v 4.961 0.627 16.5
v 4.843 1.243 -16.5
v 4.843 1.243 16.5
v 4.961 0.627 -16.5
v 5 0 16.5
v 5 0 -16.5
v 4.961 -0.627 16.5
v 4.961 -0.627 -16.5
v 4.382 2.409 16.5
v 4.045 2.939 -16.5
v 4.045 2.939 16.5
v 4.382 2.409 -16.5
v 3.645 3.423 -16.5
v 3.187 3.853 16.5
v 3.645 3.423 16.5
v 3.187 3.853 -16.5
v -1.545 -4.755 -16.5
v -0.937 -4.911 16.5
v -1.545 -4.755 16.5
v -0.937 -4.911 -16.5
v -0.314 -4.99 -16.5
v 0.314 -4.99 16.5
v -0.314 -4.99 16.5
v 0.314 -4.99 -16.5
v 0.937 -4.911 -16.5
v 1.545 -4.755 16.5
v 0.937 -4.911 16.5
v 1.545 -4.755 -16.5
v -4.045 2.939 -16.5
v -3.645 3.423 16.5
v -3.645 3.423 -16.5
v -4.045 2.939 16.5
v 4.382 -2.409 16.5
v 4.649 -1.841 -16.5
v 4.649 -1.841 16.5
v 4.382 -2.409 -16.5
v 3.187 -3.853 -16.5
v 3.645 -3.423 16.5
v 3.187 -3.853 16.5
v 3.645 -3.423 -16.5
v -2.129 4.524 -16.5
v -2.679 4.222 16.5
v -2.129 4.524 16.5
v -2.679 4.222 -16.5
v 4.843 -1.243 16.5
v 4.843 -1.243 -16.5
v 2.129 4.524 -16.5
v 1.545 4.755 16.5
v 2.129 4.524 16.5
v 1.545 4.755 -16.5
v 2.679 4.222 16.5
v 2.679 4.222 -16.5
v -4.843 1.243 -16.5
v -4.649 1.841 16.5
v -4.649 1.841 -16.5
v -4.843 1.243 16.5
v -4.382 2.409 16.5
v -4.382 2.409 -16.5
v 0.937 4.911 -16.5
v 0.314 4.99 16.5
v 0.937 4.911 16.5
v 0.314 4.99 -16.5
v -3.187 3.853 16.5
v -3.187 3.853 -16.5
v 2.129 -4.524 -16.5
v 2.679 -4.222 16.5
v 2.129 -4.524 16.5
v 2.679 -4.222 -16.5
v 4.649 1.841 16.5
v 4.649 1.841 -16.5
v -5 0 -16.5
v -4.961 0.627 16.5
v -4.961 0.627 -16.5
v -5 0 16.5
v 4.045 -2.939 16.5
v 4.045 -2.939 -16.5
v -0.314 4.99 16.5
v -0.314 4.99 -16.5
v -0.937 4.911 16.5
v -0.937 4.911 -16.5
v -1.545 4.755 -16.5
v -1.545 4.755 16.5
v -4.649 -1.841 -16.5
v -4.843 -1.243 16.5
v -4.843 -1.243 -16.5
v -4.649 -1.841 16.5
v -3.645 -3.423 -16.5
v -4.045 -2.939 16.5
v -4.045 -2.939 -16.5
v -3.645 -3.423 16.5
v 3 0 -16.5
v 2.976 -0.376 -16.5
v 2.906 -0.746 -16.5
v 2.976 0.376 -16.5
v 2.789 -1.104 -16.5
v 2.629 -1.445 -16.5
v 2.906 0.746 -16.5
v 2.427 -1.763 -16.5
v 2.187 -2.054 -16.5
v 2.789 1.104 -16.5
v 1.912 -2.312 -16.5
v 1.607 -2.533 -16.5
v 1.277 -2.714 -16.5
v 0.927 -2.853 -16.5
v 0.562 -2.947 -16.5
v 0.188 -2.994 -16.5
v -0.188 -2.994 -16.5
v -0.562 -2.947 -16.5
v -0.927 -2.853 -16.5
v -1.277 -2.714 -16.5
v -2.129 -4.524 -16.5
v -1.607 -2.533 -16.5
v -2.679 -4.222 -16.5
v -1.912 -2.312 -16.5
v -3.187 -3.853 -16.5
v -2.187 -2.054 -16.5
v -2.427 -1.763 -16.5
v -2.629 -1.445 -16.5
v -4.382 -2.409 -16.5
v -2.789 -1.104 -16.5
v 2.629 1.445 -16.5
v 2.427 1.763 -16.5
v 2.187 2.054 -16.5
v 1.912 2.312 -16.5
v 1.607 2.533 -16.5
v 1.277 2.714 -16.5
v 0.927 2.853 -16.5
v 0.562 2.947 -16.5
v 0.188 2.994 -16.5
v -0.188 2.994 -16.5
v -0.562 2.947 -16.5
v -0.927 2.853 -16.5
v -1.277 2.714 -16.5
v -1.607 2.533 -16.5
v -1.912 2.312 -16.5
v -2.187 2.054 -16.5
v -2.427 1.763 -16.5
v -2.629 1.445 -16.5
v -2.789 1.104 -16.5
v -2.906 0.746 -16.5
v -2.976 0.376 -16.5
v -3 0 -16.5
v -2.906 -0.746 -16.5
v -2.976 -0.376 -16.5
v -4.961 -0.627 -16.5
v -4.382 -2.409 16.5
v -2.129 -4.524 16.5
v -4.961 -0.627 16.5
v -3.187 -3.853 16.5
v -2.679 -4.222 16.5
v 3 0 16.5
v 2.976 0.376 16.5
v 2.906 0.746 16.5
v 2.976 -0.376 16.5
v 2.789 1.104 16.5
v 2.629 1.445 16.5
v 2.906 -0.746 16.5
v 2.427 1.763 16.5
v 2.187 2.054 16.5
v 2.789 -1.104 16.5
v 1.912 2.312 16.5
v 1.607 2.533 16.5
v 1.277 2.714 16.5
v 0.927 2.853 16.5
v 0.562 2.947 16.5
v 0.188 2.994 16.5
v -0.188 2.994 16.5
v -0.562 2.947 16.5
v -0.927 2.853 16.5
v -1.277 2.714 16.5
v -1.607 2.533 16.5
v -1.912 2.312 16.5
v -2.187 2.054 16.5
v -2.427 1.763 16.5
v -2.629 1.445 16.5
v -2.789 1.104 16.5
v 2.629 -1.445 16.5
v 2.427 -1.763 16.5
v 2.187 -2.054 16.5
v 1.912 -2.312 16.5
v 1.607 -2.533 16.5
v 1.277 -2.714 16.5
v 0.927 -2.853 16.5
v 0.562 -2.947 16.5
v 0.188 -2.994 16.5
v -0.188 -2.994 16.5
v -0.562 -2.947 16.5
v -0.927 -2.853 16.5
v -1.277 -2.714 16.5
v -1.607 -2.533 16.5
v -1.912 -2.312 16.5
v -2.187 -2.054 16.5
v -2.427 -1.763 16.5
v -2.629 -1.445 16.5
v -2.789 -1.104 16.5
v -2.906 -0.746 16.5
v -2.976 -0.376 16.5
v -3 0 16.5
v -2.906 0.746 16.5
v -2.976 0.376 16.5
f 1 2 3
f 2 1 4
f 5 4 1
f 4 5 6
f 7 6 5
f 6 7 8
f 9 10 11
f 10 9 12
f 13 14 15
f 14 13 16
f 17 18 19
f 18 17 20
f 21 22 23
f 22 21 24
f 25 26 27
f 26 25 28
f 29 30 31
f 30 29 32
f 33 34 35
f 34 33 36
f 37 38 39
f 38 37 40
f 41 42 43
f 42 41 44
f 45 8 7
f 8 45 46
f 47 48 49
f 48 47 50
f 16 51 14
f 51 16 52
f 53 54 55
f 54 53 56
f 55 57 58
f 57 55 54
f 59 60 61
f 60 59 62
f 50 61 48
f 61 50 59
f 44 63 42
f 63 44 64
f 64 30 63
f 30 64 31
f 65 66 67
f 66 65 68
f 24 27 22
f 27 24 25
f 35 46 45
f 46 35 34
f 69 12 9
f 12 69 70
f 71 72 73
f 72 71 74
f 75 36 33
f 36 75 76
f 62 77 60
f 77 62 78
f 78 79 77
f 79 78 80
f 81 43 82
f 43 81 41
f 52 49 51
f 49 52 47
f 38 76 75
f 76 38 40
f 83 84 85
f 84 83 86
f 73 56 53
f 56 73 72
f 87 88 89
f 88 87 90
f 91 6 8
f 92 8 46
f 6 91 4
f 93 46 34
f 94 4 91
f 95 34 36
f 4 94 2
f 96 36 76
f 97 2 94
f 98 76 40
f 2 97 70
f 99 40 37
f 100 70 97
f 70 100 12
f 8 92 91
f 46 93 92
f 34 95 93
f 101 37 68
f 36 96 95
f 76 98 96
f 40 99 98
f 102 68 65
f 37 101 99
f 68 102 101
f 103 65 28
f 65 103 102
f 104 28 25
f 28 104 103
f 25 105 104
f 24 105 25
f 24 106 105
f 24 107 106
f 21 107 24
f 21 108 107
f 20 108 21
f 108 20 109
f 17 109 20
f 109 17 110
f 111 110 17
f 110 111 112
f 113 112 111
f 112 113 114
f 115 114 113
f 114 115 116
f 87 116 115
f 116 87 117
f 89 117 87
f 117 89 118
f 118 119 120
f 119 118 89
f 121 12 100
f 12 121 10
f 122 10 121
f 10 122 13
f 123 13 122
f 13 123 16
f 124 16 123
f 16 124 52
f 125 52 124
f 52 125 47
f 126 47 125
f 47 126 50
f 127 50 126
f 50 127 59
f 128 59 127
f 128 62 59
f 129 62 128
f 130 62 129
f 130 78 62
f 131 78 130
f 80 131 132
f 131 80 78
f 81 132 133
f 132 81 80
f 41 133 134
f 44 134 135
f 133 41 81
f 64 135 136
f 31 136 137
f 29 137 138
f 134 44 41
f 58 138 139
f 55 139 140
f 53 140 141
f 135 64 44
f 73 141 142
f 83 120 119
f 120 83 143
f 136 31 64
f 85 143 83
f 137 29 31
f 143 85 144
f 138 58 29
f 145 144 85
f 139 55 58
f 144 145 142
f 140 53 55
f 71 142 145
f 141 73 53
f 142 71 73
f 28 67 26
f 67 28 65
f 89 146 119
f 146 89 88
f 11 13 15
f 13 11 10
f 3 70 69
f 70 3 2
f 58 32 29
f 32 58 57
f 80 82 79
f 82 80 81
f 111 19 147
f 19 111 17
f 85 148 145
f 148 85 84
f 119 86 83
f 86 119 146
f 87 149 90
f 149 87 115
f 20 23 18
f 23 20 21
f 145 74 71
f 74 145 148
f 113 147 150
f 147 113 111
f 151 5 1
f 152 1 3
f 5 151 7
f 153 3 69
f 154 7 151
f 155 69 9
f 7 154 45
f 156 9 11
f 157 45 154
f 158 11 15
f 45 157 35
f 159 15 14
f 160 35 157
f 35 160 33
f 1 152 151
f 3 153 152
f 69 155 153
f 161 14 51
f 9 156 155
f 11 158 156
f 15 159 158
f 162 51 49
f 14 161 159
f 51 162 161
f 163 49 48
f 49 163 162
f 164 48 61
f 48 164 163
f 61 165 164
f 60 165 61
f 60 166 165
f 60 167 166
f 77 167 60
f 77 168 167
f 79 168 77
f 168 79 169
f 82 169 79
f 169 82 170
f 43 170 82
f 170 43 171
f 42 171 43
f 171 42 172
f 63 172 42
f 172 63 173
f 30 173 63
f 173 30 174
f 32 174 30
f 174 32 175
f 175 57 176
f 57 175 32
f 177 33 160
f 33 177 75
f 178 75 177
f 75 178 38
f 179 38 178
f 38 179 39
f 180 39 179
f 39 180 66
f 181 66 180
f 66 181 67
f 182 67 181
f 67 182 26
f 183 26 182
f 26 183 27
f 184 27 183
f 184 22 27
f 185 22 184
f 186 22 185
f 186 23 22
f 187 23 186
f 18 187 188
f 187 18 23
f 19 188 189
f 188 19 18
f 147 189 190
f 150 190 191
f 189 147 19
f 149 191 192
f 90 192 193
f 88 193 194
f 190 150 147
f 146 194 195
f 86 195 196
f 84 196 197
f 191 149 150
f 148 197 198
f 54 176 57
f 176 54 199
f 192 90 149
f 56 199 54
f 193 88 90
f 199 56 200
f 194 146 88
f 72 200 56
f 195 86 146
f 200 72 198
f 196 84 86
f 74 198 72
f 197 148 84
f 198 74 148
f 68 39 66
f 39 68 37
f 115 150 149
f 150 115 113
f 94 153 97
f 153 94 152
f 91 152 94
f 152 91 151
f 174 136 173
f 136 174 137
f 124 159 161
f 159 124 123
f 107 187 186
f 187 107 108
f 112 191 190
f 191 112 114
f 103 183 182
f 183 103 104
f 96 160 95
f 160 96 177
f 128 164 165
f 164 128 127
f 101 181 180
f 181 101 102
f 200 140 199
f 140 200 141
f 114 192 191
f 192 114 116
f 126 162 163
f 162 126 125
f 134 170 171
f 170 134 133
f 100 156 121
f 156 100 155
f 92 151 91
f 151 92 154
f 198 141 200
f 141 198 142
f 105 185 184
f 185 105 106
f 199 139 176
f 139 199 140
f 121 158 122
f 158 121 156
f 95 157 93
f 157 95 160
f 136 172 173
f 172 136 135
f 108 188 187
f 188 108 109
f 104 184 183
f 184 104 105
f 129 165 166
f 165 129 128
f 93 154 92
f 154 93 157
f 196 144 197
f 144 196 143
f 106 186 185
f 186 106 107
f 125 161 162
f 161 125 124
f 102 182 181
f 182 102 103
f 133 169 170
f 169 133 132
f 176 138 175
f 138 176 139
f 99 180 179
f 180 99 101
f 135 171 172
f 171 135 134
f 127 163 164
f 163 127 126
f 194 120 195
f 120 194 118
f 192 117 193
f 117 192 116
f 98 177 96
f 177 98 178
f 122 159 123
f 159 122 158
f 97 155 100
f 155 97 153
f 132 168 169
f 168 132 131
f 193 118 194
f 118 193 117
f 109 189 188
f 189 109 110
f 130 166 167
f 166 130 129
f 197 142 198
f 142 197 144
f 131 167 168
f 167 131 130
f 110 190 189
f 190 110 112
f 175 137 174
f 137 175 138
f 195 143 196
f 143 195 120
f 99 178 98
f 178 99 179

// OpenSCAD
$fn = 50;


difference() {
	union() {
		translate(v = [0, 0, -16.5000000000]) {
			cylinder(h = 33, r = 5.0000000000);
		}
	}
	union() {
		translate(v = [0, 0, -100.0000000000]) {
			cylinder(h = 200, r = 3.0000000000);
		}
	}
}
